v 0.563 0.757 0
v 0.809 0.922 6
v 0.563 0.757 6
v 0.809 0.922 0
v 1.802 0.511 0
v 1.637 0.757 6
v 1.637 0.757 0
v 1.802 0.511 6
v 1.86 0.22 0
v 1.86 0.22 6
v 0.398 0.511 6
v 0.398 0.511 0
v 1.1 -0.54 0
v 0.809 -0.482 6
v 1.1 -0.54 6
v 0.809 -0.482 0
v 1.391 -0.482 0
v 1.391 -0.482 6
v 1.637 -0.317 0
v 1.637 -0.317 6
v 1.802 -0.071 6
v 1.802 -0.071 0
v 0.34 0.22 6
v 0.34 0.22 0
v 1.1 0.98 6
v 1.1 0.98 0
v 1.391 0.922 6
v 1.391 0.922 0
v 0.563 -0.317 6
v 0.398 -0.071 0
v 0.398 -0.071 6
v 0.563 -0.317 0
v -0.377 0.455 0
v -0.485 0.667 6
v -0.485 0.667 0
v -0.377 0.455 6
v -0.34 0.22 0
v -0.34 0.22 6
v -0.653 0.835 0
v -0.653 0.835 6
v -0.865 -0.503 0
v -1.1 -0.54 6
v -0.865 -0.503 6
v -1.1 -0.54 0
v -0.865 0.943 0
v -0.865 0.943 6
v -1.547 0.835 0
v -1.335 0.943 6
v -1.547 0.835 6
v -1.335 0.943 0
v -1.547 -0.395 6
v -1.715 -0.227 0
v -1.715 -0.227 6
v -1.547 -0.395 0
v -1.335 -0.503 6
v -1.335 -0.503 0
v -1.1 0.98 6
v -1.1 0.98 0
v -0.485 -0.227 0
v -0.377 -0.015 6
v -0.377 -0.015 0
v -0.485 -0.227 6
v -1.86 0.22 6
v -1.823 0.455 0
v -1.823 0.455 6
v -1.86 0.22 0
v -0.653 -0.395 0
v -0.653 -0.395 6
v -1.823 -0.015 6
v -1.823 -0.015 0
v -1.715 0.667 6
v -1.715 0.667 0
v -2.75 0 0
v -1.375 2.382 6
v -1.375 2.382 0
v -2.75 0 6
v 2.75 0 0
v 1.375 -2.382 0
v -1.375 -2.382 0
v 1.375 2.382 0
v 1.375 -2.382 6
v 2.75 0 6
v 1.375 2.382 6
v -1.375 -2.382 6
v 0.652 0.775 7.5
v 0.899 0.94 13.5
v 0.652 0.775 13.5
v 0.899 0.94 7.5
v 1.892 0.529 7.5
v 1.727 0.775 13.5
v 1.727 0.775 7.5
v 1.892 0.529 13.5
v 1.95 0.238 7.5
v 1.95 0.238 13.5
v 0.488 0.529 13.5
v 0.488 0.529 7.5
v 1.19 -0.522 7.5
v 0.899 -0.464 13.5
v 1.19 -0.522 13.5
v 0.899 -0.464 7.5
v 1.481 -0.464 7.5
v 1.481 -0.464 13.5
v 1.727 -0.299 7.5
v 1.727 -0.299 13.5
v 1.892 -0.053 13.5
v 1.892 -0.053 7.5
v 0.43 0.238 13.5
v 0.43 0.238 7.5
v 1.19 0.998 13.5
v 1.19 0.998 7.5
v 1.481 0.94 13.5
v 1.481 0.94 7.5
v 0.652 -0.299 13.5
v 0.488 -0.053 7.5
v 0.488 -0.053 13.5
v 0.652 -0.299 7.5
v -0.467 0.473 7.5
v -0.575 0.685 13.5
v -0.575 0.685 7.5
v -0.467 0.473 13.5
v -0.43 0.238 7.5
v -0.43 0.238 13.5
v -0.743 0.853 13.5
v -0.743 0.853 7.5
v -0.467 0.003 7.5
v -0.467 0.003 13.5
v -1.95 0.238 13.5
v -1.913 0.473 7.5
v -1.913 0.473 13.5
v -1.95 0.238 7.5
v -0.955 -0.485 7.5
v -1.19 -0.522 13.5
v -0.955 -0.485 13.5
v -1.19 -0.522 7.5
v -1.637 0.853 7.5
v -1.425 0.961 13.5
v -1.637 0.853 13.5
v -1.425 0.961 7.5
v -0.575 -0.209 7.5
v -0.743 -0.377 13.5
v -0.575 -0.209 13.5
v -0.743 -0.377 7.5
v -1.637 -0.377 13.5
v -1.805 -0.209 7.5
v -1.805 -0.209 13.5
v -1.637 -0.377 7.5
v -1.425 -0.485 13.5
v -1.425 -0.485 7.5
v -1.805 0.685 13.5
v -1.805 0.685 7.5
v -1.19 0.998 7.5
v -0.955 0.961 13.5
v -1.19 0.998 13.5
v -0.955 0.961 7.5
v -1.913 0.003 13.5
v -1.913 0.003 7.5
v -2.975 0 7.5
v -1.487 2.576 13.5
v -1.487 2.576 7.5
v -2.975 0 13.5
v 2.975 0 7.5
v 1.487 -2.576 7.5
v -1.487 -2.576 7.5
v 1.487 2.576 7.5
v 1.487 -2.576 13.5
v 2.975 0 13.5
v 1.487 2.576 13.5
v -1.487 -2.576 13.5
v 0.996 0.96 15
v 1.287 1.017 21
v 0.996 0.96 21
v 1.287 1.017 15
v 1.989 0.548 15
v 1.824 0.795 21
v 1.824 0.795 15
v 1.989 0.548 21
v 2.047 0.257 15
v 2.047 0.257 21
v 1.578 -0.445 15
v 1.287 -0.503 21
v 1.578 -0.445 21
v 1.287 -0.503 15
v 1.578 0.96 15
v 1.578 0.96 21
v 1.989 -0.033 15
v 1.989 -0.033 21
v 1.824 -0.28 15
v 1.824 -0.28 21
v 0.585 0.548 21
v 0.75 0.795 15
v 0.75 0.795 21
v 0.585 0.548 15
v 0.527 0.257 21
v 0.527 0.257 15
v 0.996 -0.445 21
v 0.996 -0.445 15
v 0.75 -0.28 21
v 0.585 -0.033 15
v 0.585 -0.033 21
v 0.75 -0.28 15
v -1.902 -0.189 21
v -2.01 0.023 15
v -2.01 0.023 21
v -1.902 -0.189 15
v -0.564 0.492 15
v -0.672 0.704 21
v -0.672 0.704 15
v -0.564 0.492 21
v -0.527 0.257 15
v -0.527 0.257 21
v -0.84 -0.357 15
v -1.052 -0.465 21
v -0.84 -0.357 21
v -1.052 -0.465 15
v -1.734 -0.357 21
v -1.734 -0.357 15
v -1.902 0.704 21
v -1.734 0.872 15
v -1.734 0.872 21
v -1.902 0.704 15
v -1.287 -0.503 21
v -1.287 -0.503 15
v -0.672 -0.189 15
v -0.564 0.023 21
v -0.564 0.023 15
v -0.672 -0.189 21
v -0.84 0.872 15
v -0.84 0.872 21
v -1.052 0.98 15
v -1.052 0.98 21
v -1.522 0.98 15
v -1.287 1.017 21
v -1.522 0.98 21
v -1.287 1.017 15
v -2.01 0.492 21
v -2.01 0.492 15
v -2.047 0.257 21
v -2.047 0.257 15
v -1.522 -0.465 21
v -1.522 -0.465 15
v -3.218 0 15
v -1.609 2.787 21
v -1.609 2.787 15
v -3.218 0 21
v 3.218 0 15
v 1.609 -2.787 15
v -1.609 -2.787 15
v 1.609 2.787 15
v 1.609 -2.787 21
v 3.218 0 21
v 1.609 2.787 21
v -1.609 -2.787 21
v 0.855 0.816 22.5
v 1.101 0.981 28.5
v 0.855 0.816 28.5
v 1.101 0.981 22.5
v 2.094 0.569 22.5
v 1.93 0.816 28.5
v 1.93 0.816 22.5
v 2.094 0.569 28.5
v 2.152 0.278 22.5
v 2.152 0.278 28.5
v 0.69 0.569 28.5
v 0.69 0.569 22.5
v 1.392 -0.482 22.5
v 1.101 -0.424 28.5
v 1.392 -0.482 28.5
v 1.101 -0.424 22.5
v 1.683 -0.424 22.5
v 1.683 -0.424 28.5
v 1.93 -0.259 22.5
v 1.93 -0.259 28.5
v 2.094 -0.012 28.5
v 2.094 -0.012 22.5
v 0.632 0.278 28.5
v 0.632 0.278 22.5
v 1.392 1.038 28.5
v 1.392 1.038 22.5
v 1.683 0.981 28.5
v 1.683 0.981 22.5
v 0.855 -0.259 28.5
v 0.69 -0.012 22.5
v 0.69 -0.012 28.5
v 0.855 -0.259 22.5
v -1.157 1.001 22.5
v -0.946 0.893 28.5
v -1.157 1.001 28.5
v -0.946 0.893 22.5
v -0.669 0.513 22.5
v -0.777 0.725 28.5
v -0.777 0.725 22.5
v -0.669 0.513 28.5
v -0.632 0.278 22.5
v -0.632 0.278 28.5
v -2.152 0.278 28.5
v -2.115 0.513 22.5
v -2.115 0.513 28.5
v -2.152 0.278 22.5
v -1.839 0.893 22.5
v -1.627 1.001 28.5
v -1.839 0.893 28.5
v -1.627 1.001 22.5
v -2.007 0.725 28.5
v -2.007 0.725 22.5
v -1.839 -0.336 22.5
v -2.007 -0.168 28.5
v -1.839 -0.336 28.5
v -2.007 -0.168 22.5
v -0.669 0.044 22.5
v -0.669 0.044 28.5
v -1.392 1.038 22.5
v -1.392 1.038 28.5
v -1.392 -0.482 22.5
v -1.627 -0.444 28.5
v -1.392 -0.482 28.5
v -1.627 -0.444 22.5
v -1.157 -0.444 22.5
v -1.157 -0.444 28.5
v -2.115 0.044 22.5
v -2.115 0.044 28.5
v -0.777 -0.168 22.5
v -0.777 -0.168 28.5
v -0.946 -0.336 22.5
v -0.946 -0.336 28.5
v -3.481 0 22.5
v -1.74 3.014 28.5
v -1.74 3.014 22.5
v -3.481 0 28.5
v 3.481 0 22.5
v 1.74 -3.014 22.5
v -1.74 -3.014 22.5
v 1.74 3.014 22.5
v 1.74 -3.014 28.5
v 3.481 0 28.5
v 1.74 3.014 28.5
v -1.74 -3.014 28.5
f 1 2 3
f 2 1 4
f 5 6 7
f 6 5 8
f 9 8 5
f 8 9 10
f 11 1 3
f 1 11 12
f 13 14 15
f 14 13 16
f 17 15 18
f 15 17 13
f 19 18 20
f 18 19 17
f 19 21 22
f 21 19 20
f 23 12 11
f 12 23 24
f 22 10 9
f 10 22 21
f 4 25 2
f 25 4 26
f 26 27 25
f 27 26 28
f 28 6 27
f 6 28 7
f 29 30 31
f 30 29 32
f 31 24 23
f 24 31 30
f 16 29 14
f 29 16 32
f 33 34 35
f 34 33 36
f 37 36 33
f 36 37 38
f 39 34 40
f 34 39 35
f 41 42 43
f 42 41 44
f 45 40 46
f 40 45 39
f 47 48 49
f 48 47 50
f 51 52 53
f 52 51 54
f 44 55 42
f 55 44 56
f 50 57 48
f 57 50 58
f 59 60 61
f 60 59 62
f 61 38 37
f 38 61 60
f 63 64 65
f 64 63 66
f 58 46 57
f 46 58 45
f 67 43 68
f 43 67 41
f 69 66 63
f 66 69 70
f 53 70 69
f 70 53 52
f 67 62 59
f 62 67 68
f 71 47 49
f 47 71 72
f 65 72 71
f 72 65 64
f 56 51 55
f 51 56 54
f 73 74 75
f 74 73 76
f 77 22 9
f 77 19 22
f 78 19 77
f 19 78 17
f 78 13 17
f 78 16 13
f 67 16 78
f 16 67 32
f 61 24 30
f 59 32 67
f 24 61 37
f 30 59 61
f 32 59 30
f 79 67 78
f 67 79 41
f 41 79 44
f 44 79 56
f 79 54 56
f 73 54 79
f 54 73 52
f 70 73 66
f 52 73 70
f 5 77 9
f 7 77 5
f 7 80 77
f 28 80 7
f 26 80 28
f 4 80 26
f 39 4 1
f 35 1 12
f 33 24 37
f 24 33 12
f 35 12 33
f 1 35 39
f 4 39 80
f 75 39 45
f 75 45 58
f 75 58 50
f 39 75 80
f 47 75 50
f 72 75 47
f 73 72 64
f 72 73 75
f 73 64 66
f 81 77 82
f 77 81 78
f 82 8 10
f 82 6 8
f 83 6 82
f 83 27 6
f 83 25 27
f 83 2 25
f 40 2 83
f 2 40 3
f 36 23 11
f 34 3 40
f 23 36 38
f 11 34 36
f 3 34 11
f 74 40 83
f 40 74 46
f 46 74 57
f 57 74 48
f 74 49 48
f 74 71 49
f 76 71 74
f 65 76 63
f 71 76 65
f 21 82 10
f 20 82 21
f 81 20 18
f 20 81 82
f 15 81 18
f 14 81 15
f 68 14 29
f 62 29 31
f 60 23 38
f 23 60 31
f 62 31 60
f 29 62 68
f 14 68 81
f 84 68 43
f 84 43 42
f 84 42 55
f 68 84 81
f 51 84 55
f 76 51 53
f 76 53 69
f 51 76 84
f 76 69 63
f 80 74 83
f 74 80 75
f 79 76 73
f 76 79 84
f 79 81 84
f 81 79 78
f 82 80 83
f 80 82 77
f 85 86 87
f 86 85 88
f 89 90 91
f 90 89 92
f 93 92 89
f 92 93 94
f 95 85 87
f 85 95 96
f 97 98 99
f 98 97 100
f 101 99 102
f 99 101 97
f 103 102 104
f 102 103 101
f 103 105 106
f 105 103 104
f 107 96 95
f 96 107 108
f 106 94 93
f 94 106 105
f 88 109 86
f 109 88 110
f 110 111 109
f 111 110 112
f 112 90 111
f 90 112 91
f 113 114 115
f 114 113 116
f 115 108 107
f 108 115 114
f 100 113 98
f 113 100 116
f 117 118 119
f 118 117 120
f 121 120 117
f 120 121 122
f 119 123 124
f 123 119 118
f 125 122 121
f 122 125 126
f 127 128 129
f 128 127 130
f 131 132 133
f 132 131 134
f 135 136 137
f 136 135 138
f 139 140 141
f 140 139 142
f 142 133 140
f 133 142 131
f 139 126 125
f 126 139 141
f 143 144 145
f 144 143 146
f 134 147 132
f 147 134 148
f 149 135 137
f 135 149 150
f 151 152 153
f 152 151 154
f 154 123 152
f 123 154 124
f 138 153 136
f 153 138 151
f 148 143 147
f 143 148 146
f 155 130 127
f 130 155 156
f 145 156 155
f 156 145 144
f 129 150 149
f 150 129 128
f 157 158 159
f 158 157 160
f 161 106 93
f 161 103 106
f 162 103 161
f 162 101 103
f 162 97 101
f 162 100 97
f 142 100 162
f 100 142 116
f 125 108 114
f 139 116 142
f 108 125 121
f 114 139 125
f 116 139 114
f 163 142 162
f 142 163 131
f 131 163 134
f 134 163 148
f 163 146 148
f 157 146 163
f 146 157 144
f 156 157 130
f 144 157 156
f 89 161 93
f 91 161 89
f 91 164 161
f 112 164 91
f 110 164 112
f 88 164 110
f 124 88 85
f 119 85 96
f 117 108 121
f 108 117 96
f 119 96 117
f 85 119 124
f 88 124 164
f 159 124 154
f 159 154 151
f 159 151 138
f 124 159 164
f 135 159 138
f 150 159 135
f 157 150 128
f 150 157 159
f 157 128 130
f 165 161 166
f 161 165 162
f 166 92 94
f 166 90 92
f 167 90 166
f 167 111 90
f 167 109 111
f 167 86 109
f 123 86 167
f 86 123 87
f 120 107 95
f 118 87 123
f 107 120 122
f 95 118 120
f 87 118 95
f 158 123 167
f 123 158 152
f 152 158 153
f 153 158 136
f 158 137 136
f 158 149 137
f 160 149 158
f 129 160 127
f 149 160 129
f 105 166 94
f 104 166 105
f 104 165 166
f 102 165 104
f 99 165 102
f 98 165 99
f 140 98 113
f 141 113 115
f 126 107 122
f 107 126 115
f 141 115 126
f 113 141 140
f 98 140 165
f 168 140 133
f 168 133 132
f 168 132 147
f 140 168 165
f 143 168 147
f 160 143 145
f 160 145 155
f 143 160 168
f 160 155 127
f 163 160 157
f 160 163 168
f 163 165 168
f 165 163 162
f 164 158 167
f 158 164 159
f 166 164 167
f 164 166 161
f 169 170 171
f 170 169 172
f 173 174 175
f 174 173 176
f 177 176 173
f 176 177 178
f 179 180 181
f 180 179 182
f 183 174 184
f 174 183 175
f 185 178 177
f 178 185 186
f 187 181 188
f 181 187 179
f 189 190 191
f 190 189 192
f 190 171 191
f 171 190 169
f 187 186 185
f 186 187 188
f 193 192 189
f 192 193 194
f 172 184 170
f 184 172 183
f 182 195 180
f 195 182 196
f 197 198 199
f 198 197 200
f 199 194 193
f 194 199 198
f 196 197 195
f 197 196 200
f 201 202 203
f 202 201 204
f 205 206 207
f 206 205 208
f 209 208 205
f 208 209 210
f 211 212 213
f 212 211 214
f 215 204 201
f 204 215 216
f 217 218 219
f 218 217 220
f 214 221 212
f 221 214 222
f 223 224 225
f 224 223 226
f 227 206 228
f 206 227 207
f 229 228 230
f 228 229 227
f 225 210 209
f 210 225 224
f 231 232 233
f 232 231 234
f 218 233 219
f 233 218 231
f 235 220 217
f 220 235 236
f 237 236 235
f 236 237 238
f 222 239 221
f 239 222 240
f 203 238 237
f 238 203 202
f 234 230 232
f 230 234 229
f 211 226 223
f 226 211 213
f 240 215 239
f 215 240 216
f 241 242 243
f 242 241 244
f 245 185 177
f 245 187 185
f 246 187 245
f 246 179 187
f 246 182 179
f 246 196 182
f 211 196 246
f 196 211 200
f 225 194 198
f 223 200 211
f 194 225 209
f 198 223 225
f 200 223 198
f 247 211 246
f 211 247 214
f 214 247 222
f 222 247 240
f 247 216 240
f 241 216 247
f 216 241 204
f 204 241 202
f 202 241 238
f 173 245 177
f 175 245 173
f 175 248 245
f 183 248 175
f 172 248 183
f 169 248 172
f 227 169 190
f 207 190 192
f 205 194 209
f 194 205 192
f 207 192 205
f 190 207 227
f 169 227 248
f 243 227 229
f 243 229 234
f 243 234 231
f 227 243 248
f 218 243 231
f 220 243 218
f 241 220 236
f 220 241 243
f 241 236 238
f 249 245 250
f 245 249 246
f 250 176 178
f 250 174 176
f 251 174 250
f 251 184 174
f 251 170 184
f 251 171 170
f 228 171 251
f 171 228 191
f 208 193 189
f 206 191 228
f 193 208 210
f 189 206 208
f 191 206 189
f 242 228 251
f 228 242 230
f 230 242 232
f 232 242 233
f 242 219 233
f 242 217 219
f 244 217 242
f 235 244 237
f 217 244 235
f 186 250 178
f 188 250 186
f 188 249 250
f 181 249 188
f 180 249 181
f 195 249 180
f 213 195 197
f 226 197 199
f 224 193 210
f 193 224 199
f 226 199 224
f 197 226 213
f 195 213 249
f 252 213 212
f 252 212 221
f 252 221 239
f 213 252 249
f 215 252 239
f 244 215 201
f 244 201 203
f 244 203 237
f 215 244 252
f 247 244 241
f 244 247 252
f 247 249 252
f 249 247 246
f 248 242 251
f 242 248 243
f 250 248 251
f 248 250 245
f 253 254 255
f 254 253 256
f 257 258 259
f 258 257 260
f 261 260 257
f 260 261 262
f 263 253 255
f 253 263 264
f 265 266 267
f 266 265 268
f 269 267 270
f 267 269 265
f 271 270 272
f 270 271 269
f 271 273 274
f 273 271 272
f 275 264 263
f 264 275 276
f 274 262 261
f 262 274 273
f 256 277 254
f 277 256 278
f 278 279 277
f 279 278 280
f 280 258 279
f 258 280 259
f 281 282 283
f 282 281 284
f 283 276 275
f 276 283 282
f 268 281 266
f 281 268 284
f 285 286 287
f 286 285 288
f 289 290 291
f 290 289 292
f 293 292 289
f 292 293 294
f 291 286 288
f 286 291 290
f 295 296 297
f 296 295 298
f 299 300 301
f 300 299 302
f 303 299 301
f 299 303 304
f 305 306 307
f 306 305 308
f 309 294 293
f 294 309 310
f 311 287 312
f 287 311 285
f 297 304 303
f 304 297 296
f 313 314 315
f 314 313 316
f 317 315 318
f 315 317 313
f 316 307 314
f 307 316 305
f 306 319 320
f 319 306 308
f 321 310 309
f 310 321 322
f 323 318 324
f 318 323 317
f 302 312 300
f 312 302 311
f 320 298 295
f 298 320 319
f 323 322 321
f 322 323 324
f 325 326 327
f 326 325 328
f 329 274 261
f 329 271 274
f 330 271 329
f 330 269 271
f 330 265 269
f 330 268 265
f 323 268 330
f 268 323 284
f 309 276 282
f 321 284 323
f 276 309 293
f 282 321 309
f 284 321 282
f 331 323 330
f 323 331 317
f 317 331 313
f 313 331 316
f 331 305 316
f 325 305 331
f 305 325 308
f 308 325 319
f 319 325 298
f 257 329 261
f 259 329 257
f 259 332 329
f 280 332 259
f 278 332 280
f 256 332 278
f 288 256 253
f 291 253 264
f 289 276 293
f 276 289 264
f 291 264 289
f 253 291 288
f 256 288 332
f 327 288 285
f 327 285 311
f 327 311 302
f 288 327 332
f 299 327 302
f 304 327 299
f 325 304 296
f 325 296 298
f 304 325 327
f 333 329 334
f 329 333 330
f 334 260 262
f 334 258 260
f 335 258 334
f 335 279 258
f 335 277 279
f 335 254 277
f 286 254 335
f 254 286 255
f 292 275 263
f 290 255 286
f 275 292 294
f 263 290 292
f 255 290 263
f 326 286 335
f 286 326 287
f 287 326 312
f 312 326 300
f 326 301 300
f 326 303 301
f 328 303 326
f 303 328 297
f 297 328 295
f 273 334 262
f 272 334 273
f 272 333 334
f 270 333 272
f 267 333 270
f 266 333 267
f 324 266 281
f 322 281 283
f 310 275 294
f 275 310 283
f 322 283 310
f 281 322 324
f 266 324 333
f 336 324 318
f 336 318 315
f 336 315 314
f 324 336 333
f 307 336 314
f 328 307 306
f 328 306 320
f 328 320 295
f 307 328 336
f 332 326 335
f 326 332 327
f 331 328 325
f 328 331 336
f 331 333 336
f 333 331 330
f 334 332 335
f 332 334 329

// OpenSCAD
// SpiRob Spiral Robot in OpenSCAD
// Based on the logarithmic spiral design with hexagonal segments

/* [Basic Parameters] */
// Taper angle in degrees (5, 10, or 15 recommended)
taper_angle = 10;

// Number of discrete units in the spiral
unit_count = 4;

// Total length of the spiral robot (mm)
total_length = 30;

// assume every unit is 18.75 mm

// Width at tip (mm)
tip_width = 5.5;

// Gap between units as percentage of unit height
gap_percent = 20;

// Cable hole diameter for #18 mason twine (1.52 mm)
cable_diameter = 1.52;

// Number of cables (2)
cable_count = 2;

/* [Advanced Parameters] */
// Discretization angle (degrees)
discretization_angle = 30;

// Calculate b parameter based on taper angle
function calc_b_param(angle) = 
    // This is an approximation based on the paper's values
    (angle == 5) ? 0.07 :
    (angle == 10) ? 0.15 :
    (angle == 15) ? 0.22 : 0.15;

// The b parameter of the logarithmic spiral
b_param = calc_b_param(taper_angle);

/* [Hidden] */
// Calculate the scaling ratio between units
beta = exp(b_param * discretization_angle * PI / 180);
// Height of each unit
unit_height = total_length / unit_count;
// Gap between units
gap_height = unit_height * gap_percent / 100;
// Actual height of each solid unit
solid_height = unit_height - gap_height;

// Function to create a single unit with cable holes
module create_unit(scale_factor, position_z) {
    scaled_width = tip_width * scale_factor;
    
    difference() {
        // The main hexagonal prism unit
        translate([0, 0, position_z])
        linear_extrude(height = solid_height)
        hexagon(scaled_width);
        
        // Cable holes
        if (cable_count >= 2) {
            // Calculate positions for cable holes based on scaled width
            offset_x = scaled_width/5;
            offset_y = scaled_width/5;
            
            // First cable hole
            translate([offset_x, offset_y/5, -1])
            cylinder(h = total_length + 2, d = cable_diameter, $fn = 16);
            
            // Second cable hole
            translate([-offset_x, offset_y/5, -1])
            cylinder(h = total_length, d = cable_diameter, $fn = 20);
            
        }
    }
}

// Function to create a hexagon
module hexagon(width) {
    radius = width / 2;
    angles = [0, 60, 120, 180, 240, 300];
    points = [for (a = angles) [radius * cos(a), radius * sin(a)]];
    polygon(points);
}

// Create elastic layer along the center (optional)
module elastic_layer() {
    central_axis_diameter = tip_width * 0.2;
    
    translate([0, 0, 0])
    cylinder(h = total_length, d = central_axis_diameter, $fn = 16);
}

// Main module to create the complete SpiRob
module spirob() {
    // Create the units
    for (i = [0:unit_count-1]) {
        scale_factor = pow(beta, i);
        position_z = i * unit_height;
        create_unit(scale_factor, position_z);
    }
    
    // Add elastic layer (uncomment if needed)
    // elastic_layer();
}

// Create the SpiRob
spirob();
